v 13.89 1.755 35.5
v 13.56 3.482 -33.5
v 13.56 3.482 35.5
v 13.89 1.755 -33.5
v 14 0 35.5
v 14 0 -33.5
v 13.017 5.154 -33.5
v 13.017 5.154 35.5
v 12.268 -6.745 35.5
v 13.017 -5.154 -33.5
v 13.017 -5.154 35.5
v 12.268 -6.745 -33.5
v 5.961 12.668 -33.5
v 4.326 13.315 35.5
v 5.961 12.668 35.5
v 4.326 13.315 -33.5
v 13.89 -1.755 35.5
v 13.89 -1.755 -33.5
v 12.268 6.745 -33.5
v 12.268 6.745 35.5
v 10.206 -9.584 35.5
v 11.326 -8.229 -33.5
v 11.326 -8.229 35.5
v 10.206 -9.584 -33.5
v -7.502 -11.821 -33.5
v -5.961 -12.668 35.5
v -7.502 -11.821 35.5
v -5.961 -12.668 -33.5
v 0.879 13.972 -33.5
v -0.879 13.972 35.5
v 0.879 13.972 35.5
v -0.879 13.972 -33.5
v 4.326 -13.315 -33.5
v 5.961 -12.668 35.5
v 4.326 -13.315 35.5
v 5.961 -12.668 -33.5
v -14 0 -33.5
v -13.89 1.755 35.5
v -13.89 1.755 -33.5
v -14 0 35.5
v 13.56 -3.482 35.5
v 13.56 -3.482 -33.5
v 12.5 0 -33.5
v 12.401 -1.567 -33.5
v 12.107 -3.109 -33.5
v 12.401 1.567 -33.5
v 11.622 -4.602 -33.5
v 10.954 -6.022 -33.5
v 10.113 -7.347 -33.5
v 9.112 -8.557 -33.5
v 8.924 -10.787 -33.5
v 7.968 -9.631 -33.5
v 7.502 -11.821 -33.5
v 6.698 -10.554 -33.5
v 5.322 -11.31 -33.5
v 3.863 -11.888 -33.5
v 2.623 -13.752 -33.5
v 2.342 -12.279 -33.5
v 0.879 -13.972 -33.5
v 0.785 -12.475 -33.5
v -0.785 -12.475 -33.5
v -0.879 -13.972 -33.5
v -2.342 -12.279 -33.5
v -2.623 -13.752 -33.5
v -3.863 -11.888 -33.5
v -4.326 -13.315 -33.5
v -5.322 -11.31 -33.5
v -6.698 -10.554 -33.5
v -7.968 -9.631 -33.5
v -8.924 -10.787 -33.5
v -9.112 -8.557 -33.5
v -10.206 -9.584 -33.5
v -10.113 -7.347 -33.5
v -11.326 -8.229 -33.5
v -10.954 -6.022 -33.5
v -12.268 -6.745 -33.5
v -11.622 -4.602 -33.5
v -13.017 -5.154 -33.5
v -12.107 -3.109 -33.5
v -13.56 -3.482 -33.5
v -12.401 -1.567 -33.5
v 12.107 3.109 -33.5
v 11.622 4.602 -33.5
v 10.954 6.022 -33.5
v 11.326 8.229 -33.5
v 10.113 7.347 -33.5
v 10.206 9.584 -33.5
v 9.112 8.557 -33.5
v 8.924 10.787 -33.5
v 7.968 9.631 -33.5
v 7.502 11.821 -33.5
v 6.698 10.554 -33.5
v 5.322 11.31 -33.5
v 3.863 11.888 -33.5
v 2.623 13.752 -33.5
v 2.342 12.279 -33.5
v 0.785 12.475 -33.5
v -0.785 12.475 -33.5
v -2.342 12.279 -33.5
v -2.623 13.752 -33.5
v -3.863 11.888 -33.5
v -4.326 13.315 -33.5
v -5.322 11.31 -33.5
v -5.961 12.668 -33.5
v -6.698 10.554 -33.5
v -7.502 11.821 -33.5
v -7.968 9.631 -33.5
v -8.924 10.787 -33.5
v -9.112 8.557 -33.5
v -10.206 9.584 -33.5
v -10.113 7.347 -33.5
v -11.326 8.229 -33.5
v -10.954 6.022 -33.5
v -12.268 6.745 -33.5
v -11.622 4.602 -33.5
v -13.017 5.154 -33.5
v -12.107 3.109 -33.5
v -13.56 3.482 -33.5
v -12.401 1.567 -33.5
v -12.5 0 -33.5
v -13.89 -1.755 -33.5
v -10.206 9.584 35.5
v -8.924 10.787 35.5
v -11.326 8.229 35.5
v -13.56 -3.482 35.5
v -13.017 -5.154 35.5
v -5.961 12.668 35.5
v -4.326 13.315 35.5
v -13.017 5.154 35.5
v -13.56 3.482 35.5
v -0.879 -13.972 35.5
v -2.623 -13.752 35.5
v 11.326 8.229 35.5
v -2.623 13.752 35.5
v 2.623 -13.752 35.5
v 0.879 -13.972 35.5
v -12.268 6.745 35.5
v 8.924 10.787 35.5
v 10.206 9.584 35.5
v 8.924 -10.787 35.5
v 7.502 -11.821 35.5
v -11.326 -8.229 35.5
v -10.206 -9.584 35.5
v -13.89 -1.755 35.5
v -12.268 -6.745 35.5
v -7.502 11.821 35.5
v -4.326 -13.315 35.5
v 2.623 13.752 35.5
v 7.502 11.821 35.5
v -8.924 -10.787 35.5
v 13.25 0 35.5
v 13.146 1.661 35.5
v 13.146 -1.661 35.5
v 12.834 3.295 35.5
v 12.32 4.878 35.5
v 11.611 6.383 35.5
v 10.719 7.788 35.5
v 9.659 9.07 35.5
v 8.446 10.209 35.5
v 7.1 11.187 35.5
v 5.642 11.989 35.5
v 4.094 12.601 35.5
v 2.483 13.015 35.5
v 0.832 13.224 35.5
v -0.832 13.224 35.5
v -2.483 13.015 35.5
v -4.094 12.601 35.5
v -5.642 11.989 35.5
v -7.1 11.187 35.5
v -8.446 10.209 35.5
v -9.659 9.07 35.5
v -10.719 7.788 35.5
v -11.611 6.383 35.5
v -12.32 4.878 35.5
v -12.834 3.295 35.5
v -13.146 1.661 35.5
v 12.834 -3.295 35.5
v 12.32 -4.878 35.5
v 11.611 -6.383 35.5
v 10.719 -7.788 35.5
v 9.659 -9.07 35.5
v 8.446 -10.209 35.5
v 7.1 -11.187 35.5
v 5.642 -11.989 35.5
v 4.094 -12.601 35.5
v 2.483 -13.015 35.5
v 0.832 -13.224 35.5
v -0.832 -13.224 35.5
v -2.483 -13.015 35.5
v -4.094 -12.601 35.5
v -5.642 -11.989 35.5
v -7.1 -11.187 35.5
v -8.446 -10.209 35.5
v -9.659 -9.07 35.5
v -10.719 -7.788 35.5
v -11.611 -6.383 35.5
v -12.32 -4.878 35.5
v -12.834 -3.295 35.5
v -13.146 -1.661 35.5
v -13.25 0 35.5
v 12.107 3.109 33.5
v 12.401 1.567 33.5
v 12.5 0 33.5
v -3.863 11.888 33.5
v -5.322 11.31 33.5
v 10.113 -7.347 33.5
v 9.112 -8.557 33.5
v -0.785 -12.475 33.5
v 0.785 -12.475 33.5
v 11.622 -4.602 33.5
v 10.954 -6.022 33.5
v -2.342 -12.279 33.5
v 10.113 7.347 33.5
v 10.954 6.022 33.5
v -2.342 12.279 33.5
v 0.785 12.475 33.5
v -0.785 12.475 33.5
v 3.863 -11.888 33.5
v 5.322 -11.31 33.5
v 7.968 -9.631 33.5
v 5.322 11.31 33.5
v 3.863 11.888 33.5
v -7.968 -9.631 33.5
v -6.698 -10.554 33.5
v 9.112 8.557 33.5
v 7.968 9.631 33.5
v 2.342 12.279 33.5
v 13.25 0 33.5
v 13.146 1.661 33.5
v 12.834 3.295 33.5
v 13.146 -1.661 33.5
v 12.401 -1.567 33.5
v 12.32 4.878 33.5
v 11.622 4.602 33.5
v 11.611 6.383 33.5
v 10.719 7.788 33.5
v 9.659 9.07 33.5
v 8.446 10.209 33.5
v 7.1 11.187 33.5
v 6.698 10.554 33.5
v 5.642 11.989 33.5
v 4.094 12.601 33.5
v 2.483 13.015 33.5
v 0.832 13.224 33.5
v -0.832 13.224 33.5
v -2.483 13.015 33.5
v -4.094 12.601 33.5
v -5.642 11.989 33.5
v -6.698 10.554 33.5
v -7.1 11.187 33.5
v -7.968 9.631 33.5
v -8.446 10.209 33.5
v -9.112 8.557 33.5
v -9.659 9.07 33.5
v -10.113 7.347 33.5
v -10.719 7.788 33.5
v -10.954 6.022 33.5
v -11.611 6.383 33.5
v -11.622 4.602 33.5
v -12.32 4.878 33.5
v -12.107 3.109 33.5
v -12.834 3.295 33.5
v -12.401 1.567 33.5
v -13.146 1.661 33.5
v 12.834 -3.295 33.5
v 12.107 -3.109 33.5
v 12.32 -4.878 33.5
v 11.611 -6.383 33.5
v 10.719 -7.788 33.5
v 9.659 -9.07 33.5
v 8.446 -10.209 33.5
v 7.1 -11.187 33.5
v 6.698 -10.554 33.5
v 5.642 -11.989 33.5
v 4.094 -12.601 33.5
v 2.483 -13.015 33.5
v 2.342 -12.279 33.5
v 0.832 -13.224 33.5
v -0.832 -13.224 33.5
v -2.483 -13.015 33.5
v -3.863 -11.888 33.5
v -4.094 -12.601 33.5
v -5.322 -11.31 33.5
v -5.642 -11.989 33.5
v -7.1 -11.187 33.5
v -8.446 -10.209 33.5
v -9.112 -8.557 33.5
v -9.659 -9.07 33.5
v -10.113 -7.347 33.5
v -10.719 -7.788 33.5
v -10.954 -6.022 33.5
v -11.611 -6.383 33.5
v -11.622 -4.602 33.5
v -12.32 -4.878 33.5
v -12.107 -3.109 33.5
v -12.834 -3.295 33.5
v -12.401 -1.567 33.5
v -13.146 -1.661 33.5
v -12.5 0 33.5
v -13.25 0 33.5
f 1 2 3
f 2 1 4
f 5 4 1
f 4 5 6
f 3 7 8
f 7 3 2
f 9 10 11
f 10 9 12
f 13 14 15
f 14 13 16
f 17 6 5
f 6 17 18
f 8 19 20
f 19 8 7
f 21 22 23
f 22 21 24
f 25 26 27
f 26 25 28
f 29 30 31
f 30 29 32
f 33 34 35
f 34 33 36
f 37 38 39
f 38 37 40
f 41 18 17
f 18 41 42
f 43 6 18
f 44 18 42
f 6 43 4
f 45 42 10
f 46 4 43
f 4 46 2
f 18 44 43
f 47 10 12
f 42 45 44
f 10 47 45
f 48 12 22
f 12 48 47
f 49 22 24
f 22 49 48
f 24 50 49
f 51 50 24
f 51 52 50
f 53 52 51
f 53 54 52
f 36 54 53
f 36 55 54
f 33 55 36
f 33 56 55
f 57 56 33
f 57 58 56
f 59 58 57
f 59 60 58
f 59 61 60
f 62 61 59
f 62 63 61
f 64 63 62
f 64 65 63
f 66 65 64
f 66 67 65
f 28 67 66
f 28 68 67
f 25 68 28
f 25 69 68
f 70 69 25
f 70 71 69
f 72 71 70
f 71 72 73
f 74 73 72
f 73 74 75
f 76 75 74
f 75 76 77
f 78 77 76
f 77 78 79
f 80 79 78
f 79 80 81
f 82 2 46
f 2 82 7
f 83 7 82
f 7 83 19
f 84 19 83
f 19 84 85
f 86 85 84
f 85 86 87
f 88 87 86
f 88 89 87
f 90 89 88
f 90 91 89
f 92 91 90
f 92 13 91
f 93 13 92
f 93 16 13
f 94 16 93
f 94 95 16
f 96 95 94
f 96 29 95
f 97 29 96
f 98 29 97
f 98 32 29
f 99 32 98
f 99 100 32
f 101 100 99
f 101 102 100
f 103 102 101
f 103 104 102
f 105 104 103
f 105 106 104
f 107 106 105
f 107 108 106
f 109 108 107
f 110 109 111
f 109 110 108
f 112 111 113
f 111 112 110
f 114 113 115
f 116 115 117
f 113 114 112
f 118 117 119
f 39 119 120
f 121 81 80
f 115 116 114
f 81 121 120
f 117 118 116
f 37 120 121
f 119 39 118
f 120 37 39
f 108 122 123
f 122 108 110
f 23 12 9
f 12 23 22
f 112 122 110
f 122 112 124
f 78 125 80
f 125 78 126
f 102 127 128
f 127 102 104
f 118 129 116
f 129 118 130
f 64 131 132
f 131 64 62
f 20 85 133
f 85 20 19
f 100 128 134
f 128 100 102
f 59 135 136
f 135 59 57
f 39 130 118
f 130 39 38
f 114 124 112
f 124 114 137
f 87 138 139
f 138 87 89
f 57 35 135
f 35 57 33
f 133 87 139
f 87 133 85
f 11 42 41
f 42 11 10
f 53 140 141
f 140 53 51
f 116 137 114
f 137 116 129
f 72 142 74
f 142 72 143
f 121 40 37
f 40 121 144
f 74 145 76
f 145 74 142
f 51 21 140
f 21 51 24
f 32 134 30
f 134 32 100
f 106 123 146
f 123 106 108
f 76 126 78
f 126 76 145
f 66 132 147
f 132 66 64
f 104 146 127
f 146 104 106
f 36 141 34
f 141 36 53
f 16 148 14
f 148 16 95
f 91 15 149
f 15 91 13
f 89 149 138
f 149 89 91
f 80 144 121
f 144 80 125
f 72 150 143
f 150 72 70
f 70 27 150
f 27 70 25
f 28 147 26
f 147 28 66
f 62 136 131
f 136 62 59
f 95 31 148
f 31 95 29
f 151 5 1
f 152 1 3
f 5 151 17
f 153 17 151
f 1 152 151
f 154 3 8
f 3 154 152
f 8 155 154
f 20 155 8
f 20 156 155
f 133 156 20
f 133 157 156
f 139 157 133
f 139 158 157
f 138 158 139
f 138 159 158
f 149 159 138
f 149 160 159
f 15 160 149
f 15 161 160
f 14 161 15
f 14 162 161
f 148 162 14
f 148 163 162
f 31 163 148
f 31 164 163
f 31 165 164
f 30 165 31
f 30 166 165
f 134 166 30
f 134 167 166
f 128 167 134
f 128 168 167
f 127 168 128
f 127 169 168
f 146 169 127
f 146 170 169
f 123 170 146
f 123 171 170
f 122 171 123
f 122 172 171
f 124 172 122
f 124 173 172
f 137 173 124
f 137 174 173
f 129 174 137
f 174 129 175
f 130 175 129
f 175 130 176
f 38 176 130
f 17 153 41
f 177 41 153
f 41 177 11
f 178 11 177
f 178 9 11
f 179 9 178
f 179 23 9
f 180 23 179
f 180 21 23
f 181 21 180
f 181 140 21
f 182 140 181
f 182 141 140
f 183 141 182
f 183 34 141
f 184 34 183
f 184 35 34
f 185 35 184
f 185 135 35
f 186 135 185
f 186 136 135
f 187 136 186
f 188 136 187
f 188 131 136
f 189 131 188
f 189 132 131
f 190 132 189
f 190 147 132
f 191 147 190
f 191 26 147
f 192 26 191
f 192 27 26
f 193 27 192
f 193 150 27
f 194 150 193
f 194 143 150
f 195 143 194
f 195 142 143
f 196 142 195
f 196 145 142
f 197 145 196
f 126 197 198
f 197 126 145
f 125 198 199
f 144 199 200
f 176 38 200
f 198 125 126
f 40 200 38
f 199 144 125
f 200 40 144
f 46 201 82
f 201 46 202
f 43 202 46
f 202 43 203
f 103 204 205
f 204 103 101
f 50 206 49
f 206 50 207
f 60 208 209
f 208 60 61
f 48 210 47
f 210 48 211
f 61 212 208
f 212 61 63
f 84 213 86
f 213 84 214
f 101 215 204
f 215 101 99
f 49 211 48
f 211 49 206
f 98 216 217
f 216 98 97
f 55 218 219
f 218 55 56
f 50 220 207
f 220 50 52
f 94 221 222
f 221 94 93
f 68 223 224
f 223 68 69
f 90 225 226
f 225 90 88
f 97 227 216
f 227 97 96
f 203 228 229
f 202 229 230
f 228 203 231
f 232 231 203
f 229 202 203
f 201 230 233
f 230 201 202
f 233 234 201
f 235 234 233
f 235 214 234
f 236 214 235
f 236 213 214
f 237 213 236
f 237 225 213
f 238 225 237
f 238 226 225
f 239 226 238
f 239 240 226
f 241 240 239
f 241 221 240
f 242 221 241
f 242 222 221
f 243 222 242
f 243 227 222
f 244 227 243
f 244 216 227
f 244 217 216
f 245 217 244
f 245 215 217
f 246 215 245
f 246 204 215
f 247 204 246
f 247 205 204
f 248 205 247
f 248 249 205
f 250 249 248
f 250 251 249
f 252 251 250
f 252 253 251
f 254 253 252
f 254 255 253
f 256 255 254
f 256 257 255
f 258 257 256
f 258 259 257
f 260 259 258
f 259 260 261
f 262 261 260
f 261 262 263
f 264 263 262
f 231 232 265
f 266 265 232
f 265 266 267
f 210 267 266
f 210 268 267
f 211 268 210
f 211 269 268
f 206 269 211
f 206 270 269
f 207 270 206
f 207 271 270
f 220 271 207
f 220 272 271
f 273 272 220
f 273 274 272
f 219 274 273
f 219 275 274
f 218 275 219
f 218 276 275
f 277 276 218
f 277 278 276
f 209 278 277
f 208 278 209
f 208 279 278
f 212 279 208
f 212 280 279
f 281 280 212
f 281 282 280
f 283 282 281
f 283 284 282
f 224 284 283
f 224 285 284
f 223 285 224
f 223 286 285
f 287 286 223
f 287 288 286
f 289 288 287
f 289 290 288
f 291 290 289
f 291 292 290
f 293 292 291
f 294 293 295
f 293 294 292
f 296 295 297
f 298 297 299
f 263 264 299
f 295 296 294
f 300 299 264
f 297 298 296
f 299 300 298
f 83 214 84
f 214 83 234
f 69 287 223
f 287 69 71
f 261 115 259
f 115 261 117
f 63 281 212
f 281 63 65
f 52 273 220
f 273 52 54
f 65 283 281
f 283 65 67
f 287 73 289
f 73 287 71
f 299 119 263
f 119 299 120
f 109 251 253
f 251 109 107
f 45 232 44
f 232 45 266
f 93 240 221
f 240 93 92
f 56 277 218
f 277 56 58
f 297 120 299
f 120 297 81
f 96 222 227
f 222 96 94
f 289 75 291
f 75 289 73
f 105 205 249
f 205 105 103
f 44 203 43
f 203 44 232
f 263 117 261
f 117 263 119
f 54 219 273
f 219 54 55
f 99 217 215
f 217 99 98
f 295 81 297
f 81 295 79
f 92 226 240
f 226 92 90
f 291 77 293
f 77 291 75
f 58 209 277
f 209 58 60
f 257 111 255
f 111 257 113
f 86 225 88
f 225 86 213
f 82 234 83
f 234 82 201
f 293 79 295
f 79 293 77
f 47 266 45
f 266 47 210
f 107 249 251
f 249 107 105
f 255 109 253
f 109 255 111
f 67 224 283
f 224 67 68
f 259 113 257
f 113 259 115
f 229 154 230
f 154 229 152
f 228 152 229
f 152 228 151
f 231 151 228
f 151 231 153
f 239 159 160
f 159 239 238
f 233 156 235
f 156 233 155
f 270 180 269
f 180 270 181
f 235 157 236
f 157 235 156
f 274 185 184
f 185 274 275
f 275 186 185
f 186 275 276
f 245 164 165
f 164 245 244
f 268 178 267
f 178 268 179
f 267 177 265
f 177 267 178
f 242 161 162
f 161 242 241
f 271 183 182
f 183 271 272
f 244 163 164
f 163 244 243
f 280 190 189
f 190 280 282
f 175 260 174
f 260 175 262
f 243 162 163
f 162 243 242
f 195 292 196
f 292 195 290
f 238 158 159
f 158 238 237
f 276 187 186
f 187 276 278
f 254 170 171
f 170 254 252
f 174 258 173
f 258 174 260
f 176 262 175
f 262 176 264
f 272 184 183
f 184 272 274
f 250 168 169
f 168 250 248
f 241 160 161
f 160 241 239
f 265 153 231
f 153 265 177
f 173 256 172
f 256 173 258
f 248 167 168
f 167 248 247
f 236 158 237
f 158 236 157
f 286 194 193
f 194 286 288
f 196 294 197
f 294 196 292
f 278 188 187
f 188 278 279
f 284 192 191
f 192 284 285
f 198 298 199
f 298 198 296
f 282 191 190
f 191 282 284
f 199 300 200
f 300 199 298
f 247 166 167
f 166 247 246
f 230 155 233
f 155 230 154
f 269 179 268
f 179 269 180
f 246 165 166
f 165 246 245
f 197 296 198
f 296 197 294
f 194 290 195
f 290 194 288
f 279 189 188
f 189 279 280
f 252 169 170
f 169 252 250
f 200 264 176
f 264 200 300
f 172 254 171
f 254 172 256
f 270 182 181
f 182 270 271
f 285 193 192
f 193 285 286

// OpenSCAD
$fn=50;

lens_dia = 26;
lens_thickness = 12.3;
lens_rad = 28;
lens_ffd = 75;
lens_rfd = 67;
lens_dia_allowance = 0.5;

tube_rfd_factor = 1.0;

tube_od = 28;
tube_id = 25;
thread_length = 10;

// Basic representation of the lens
module lens() {
    intersection() {
        cylinder(h=lens_thickness, d=lens_dia);
        translate([0, 0, -(lens_rad-lens_thickness)]) sphere(r=lens_rad);
        }
}

module tube1() {
    difference() {
        cylinder(h=lens_rfd*tube_rfd_factor+2, d=tube_od);
        cylinder(h=lens_rfd*tube_rfd_factor, d=tube_id);
        translate([0, 0, lens_rfd*tube_rfd_factor]) cylinder(h=2, d=lens_dia+lens_dia_allowance);
    }
}

%lens();
translate([0, 0, -lens_rfd/2]) tube1();
